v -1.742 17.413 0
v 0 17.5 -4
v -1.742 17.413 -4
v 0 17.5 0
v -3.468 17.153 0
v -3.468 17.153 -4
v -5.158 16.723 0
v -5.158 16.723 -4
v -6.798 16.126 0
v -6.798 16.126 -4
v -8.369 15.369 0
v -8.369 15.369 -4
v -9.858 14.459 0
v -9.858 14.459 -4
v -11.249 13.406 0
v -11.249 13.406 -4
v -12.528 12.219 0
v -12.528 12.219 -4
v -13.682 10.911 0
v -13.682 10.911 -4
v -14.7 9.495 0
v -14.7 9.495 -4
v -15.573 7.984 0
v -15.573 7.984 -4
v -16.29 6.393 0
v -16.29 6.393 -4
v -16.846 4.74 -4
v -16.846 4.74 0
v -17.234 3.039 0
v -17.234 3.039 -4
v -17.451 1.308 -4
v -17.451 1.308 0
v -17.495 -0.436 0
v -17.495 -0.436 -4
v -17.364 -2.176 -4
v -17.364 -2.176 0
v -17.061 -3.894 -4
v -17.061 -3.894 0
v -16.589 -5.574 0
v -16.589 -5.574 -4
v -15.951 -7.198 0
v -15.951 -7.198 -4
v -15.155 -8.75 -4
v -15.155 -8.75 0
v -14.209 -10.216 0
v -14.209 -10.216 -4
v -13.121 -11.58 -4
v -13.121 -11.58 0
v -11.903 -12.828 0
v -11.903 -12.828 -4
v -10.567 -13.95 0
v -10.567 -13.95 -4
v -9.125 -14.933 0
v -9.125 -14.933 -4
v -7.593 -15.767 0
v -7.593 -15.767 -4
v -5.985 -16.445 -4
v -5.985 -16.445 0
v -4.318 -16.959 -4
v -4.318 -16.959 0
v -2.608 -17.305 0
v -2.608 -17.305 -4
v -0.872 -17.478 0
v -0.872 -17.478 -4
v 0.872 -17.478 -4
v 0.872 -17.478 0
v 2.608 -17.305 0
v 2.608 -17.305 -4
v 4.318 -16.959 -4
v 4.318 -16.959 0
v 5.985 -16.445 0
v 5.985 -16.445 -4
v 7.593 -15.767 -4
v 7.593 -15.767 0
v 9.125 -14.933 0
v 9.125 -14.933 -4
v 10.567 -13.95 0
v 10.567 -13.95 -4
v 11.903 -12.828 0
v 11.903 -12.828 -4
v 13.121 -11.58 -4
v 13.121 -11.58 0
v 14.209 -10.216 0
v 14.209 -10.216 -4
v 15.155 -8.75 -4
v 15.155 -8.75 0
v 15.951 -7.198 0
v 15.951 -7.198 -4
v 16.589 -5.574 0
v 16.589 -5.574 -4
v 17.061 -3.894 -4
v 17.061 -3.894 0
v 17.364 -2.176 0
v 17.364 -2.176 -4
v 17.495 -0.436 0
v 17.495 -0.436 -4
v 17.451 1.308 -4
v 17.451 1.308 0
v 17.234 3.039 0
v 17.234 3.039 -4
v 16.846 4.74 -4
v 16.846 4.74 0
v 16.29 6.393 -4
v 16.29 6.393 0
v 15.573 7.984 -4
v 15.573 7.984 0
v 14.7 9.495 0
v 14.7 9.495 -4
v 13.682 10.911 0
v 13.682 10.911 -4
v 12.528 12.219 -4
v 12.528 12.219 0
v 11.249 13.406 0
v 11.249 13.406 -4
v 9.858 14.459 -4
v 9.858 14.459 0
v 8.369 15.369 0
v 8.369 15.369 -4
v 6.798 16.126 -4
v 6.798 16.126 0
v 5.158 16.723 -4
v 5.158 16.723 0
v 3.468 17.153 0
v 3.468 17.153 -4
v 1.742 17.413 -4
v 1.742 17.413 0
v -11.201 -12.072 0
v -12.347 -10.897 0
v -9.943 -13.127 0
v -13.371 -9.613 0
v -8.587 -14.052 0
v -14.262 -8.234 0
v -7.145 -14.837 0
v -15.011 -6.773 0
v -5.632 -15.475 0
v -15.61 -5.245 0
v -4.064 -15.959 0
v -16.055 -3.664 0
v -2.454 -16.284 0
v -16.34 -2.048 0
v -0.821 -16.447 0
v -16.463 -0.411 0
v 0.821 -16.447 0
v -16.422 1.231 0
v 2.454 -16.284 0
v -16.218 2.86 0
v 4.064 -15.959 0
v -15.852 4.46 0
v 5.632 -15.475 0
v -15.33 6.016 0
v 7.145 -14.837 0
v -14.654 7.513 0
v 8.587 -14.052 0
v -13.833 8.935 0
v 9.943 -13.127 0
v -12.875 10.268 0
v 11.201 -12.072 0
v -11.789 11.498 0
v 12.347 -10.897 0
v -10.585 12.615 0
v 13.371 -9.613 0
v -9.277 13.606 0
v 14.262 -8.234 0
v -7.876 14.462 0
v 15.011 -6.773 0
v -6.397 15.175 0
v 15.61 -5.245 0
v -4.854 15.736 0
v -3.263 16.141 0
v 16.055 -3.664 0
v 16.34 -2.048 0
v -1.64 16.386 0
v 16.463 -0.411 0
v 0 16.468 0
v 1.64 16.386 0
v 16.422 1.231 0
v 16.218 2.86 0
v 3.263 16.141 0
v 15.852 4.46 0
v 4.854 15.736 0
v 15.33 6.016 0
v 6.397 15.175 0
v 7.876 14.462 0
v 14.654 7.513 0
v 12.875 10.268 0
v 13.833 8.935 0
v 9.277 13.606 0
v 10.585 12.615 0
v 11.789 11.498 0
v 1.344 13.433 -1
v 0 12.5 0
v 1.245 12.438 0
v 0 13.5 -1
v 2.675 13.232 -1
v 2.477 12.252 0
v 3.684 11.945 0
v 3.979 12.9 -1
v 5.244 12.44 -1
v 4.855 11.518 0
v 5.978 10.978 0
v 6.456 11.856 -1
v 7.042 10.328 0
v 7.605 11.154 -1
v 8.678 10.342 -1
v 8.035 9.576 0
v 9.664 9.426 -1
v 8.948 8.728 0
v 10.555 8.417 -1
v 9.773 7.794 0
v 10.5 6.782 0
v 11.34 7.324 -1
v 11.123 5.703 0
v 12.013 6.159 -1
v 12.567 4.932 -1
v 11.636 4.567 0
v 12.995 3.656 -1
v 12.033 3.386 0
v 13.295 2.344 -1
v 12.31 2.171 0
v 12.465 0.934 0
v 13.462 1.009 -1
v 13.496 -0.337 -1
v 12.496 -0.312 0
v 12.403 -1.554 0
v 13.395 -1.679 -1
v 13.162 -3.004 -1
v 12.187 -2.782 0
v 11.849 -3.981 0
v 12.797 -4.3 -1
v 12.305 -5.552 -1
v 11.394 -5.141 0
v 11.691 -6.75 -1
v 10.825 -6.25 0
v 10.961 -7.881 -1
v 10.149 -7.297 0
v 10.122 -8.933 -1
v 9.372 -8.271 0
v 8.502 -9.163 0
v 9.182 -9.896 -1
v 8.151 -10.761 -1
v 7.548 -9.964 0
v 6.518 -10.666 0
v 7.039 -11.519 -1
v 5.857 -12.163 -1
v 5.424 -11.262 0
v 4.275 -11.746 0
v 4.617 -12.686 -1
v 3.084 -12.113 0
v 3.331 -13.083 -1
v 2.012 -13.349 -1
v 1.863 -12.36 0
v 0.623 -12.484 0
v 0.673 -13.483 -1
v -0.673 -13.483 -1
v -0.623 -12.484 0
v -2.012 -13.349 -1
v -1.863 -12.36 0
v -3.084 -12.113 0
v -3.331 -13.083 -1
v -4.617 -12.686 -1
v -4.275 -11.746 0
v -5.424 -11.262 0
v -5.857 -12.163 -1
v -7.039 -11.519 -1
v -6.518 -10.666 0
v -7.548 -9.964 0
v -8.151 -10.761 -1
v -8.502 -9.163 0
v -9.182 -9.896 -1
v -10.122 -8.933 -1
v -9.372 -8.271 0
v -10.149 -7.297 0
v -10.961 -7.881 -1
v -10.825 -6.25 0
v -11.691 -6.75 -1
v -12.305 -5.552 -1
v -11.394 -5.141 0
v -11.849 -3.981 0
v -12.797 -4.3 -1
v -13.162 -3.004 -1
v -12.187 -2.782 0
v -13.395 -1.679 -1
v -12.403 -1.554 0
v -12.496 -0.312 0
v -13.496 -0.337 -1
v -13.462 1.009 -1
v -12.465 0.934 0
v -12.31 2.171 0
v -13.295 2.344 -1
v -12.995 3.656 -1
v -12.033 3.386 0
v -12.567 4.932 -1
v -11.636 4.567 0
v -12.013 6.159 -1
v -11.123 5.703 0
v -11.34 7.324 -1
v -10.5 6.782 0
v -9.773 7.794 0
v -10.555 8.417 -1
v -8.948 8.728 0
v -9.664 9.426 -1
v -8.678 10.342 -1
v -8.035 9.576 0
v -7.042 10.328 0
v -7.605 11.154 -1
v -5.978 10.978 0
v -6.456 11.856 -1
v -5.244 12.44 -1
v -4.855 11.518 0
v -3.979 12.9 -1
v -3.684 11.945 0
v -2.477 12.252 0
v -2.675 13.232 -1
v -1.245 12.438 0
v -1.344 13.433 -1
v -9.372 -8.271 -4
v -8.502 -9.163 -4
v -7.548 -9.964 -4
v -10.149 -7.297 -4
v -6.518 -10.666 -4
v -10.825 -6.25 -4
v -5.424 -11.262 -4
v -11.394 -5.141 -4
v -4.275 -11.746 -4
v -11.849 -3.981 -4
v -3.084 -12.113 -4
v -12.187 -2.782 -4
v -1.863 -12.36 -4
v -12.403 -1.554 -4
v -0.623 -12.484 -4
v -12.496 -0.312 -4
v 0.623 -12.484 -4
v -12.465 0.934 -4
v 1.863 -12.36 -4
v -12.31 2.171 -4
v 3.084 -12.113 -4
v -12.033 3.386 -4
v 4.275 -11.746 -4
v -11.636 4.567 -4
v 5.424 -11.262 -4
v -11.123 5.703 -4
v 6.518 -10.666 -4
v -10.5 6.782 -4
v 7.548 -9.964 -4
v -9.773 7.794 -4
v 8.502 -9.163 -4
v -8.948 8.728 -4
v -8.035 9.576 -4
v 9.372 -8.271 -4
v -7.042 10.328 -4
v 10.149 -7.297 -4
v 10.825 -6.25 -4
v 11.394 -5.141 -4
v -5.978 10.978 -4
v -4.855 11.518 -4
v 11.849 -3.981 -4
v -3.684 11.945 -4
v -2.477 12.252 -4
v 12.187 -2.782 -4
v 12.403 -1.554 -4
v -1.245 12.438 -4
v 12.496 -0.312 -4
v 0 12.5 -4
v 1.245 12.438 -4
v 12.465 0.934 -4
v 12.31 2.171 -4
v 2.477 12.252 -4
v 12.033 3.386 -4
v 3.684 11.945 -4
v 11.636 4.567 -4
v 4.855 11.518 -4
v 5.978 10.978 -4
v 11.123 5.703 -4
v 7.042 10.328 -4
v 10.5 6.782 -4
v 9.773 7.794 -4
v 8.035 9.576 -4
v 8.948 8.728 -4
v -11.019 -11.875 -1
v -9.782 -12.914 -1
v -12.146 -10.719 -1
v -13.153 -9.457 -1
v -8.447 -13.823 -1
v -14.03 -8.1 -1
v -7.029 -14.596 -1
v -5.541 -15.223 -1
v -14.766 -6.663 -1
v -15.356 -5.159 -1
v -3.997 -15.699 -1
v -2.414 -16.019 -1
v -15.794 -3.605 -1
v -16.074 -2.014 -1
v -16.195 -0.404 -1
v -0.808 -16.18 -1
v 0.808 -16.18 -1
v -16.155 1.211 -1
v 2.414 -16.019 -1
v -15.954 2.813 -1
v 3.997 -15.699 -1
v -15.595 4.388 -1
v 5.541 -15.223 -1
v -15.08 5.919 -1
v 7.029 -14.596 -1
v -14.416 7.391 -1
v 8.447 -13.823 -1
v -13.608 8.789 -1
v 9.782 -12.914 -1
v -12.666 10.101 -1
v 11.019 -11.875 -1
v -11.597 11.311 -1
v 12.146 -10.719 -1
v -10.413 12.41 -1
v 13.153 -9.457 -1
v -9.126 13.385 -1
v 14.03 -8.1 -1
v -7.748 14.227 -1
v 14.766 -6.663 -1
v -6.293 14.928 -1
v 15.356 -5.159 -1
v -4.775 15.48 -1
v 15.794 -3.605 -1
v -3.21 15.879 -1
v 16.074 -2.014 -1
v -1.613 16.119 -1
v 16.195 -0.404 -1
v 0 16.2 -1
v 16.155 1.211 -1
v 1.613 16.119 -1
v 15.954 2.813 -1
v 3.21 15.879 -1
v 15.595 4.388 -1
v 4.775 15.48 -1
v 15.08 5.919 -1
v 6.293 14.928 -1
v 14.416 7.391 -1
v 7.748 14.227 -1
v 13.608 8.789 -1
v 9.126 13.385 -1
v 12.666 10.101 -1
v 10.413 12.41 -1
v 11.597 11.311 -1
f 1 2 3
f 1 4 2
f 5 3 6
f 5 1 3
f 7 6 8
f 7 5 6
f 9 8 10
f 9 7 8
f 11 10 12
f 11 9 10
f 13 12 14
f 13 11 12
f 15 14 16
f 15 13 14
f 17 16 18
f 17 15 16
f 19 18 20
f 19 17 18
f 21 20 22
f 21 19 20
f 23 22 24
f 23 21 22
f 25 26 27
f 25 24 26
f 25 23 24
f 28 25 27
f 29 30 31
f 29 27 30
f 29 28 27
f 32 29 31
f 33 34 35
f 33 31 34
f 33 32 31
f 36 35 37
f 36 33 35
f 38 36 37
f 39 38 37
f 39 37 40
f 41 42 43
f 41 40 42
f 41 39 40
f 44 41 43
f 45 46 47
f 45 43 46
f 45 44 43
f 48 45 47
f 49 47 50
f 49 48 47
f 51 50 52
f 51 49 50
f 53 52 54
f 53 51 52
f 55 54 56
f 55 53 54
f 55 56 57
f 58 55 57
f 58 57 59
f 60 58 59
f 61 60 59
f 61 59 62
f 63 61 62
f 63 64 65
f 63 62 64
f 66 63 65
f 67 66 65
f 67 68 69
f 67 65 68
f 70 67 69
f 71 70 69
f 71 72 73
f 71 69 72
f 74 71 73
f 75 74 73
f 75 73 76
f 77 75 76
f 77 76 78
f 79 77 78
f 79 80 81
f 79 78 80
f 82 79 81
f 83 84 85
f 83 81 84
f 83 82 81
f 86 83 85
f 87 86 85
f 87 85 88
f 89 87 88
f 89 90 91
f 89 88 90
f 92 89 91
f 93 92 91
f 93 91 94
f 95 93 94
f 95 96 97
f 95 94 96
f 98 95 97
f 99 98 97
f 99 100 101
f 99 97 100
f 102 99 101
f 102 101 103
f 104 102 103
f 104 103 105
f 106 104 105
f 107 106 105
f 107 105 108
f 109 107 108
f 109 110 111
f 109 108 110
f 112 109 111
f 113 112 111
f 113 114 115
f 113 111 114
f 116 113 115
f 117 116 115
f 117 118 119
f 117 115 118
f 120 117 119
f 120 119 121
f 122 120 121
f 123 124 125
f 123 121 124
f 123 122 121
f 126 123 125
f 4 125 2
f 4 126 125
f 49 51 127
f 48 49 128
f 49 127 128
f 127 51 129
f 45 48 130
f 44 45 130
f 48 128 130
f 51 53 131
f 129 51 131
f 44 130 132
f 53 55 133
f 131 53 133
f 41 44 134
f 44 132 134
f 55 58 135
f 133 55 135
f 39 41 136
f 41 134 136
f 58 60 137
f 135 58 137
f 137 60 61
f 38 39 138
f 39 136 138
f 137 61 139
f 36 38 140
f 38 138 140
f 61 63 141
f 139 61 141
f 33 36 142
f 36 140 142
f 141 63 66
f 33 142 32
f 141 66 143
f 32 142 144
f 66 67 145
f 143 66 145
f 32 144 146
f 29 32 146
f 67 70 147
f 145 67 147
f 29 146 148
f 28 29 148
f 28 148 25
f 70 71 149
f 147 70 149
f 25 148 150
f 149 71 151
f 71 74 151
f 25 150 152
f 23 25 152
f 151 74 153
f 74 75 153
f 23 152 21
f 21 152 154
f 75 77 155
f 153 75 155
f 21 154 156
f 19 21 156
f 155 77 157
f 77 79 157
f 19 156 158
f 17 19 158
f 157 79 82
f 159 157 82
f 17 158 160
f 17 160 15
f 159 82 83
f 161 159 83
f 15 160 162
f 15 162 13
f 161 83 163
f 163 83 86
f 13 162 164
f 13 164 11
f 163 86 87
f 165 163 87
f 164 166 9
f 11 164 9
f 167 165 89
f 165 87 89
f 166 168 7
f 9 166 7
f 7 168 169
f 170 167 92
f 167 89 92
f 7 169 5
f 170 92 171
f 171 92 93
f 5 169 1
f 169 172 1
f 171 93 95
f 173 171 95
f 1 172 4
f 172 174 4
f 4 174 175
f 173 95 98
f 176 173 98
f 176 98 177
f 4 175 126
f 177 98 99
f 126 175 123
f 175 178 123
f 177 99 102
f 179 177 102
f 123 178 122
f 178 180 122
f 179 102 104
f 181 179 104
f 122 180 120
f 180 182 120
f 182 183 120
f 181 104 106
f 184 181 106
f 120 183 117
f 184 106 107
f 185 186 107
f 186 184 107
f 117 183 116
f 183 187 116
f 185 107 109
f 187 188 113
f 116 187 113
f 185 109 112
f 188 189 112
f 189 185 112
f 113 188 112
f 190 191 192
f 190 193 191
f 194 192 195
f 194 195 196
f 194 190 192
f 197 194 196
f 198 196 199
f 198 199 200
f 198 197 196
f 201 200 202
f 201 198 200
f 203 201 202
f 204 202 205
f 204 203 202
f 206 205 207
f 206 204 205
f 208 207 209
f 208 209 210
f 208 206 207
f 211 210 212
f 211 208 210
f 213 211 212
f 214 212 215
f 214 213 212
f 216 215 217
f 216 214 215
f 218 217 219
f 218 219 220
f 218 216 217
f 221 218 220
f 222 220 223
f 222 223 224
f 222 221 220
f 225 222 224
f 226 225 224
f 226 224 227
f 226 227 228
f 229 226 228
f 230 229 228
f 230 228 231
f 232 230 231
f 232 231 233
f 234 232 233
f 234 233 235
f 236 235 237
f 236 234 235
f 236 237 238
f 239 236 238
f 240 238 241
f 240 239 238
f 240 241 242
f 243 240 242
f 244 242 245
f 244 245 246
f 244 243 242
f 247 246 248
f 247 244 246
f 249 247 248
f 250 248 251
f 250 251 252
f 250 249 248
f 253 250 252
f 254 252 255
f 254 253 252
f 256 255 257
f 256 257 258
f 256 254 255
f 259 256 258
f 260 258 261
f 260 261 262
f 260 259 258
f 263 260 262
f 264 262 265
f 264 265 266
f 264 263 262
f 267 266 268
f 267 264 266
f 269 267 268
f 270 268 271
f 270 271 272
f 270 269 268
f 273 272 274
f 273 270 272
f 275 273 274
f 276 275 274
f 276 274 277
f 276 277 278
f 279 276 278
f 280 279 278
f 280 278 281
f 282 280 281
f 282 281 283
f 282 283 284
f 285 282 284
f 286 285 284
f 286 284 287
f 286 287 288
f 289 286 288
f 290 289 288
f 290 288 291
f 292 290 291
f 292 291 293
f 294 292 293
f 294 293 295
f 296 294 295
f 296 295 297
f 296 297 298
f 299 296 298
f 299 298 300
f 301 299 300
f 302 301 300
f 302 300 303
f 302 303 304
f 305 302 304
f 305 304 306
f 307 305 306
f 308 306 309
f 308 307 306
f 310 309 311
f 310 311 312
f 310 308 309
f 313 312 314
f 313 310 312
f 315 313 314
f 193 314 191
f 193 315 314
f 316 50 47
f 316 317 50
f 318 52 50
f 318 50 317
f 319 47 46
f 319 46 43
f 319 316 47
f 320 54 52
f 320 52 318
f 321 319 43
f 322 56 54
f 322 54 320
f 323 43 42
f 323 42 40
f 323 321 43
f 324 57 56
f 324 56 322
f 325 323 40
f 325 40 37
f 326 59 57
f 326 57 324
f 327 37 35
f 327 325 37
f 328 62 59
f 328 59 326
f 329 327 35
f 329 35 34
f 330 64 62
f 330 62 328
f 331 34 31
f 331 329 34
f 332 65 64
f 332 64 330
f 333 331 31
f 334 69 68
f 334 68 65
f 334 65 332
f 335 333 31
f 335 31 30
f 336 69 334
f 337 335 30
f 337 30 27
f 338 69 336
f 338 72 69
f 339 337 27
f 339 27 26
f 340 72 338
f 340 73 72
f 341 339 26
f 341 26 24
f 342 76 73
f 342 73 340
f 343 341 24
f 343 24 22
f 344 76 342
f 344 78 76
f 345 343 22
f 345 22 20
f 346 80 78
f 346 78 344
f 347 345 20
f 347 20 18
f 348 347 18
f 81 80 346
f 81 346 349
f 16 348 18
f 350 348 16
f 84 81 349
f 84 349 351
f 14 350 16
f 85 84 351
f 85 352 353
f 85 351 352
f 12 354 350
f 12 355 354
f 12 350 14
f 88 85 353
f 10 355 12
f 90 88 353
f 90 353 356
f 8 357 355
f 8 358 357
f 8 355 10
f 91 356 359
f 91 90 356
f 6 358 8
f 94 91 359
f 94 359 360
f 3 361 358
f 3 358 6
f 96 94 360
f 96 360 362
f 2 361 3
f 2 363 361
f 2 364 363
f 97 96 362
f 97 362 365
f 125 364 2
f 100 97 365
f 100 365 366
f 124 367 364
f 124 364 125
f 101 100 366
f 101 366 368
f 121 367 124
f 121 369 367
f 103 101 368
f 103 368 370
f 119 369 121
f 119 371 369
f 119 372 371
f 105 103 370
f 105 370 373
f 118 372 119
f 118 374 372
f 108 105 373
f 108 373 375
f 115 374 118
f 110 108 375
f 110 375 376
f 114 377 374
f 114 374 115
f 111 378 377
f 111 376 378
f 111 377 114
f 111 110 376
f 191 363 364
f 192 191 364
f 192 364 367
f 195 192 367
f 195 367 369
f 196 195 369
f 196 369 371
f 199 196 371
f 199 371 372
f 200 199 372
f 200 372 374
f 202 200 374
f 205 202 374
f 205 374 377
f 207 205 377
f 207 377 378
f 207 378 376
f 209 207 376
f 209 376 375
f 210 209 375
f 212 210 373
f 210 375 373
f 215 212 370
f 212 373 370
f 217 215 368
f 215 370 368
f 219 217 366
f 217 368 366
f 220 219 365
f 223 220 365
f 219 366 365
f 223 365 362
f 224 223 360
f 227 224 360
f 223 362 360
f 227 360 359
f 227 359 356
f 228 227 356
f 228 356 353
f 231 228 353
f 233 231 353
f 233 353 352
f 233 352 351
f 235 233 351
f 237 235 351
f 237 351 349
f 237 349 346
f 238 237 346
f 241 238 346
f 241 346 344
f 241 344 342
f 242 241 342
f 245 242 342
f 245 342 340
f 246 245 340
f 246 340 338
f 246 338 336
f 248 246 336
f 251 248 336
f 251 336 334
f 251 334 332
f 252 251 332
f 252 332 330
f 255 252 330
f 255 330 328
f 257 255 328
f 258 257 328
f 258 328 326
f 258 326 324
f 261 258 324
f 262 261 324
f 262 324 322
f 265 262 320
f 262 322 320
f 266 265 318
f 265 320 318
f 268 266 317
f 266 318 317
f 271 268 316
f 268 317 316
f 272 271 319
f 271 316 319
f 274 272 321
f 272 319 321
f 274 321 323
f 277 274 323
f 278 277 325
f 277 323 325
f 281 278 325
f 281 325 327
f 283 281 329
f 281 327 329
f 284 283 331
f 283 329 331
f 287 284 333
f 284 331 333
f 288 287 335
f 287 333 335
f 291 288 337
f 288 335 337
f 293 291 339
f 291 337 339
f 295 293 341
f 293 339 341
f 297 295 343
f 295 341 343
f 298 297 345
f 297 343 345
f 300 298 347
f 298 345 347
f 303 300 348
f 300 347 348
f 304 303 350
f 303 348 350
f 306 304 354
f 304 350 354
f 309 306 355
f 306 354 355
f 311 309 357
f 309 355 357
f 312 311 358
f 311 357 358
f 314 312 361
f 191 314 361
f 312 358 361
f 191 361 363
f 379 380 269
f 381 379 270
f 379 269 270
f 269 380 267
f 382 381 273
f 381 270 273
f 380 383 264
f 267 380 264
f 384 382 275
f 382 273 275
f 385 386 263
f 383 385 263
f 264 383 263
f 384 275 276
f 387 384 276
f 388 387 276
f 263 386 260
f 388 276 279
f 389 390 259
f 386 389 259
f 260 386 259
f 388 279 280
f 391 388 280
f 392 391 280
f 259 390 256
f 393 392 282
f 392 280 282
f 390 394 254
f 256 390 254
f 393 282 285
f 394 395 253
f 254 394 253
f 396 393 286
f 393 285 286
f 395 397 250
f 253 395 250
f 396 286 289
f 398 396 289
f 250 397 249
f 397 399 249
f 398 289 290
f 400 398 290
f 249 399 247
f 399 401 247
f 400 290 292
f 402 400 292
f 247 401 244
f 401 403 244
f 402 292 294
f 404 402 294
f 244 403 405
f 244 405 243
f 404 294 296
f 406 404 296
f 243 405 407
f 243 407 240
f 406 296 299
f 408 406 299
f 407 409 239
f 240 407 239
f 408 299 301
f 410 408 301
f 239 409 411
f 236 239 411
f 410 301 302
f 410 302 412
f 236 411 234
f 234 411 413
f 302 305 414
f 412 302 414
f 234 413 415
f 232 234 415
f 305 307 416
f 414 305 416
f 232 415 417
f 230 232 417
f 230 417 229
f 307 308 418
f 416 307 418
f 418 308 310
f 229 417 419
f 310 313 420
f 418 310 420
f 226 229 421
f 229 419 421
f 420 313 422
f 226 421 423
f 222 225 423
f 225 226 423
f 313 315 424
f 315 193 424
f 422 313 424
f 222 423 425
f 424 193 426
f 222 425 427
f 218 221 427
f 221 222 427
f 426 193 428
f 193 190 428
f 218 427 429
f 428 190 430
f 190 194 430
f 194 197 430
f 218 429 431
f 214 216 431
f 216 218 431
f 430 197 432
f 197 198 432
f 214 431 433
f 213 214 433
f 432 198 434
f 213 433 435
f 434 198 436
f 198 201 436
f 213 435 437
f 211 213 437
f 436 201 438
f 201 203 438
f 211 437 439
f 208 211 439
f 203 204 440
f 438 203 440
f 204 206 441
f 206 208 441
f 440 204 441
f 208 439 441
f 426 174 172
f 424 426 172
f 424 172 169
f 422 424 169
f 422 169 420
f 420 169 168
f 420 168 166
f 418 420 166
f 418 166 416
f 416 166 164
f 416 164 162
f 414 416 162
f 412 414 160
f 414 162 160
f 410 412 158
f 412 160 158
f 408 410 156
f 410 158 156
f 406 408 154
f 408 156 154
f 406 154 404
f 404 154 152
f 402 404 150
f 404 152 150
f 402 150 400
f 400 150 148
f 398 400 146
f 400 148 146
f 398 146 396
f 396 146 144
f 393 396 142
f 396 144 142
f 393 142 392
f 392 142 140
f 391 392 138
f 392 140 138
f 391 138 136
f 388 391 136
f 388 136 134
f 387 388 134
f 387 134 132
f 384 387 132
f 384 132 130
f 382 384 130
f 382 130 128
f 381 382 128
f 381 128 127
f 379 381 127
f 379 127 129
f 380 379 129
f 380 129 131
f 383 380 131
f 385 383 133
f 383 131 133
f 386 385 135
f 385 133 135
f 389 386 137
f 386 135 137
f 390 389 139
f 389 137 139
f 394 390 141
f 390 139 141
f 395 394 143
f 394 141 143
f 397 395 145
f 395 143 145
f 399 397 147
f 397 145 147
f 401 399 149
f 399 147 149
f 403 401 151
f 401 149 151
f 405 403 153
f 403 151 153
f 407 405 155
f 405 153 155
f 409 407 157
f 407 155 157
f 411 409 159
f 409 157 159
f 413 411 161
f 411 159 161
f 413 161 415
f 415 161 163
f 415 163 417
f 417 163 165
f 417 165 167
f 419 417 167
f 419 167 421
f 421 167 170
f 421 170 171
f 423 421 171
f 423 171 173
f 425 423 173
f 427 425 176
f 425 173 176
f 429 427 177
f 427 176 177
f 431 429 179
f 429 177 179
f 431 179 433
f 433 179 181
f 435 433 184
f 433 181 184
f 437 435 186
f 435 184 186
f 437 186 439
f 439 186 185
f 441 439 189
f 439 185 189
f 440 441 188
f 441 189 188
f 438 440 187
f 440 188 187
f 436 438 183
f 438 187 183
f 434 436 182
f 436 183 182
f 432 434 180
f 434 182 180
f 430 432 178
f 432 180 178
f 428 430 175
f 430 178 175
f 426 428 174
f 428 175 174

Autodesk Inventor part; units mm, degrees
sketch "Sketch_1" plane through (0, 0, 0) normal (1, 0, 0) x (0, 1, 0)
  line L0 (0, -4) -> (0, 0)
  line L1 (12.5, 0) -> (12.5, -4)
  line L2 (12.5, -4) -> (17.5, -4)
  line L3 (17.5, -4) -> (17.5, 0)
  line L4 (17.5, 0) -> (16.4679, 0)
  line L5 (16.4679, 0) -> (16.2, -1)
  line L6 (16.2, -1) -> (13.5, -1)
  line L7 (13.5, -1) -> (12.5, 0)
revolve "Revolution1" add sketch "Sketch_1" angle 360 about axis through (0, 0, -4) along (0, 0, -1)
ref_plane "ANBAU_XY" through (0, 0, -4) normal (0, 0, 1) x (1, 0, 0)
ref_plane "ANBAU_YZ" through (0, 0, -4) normal (1, 0, 0) x (0, 1, 0)
ref_plane "ANBAU_ZX" through (0, 0, -4) normal (0, 1, 0) x (0, 0, 1)
properties part number "247465 FEN-80-SD---(SD)"
